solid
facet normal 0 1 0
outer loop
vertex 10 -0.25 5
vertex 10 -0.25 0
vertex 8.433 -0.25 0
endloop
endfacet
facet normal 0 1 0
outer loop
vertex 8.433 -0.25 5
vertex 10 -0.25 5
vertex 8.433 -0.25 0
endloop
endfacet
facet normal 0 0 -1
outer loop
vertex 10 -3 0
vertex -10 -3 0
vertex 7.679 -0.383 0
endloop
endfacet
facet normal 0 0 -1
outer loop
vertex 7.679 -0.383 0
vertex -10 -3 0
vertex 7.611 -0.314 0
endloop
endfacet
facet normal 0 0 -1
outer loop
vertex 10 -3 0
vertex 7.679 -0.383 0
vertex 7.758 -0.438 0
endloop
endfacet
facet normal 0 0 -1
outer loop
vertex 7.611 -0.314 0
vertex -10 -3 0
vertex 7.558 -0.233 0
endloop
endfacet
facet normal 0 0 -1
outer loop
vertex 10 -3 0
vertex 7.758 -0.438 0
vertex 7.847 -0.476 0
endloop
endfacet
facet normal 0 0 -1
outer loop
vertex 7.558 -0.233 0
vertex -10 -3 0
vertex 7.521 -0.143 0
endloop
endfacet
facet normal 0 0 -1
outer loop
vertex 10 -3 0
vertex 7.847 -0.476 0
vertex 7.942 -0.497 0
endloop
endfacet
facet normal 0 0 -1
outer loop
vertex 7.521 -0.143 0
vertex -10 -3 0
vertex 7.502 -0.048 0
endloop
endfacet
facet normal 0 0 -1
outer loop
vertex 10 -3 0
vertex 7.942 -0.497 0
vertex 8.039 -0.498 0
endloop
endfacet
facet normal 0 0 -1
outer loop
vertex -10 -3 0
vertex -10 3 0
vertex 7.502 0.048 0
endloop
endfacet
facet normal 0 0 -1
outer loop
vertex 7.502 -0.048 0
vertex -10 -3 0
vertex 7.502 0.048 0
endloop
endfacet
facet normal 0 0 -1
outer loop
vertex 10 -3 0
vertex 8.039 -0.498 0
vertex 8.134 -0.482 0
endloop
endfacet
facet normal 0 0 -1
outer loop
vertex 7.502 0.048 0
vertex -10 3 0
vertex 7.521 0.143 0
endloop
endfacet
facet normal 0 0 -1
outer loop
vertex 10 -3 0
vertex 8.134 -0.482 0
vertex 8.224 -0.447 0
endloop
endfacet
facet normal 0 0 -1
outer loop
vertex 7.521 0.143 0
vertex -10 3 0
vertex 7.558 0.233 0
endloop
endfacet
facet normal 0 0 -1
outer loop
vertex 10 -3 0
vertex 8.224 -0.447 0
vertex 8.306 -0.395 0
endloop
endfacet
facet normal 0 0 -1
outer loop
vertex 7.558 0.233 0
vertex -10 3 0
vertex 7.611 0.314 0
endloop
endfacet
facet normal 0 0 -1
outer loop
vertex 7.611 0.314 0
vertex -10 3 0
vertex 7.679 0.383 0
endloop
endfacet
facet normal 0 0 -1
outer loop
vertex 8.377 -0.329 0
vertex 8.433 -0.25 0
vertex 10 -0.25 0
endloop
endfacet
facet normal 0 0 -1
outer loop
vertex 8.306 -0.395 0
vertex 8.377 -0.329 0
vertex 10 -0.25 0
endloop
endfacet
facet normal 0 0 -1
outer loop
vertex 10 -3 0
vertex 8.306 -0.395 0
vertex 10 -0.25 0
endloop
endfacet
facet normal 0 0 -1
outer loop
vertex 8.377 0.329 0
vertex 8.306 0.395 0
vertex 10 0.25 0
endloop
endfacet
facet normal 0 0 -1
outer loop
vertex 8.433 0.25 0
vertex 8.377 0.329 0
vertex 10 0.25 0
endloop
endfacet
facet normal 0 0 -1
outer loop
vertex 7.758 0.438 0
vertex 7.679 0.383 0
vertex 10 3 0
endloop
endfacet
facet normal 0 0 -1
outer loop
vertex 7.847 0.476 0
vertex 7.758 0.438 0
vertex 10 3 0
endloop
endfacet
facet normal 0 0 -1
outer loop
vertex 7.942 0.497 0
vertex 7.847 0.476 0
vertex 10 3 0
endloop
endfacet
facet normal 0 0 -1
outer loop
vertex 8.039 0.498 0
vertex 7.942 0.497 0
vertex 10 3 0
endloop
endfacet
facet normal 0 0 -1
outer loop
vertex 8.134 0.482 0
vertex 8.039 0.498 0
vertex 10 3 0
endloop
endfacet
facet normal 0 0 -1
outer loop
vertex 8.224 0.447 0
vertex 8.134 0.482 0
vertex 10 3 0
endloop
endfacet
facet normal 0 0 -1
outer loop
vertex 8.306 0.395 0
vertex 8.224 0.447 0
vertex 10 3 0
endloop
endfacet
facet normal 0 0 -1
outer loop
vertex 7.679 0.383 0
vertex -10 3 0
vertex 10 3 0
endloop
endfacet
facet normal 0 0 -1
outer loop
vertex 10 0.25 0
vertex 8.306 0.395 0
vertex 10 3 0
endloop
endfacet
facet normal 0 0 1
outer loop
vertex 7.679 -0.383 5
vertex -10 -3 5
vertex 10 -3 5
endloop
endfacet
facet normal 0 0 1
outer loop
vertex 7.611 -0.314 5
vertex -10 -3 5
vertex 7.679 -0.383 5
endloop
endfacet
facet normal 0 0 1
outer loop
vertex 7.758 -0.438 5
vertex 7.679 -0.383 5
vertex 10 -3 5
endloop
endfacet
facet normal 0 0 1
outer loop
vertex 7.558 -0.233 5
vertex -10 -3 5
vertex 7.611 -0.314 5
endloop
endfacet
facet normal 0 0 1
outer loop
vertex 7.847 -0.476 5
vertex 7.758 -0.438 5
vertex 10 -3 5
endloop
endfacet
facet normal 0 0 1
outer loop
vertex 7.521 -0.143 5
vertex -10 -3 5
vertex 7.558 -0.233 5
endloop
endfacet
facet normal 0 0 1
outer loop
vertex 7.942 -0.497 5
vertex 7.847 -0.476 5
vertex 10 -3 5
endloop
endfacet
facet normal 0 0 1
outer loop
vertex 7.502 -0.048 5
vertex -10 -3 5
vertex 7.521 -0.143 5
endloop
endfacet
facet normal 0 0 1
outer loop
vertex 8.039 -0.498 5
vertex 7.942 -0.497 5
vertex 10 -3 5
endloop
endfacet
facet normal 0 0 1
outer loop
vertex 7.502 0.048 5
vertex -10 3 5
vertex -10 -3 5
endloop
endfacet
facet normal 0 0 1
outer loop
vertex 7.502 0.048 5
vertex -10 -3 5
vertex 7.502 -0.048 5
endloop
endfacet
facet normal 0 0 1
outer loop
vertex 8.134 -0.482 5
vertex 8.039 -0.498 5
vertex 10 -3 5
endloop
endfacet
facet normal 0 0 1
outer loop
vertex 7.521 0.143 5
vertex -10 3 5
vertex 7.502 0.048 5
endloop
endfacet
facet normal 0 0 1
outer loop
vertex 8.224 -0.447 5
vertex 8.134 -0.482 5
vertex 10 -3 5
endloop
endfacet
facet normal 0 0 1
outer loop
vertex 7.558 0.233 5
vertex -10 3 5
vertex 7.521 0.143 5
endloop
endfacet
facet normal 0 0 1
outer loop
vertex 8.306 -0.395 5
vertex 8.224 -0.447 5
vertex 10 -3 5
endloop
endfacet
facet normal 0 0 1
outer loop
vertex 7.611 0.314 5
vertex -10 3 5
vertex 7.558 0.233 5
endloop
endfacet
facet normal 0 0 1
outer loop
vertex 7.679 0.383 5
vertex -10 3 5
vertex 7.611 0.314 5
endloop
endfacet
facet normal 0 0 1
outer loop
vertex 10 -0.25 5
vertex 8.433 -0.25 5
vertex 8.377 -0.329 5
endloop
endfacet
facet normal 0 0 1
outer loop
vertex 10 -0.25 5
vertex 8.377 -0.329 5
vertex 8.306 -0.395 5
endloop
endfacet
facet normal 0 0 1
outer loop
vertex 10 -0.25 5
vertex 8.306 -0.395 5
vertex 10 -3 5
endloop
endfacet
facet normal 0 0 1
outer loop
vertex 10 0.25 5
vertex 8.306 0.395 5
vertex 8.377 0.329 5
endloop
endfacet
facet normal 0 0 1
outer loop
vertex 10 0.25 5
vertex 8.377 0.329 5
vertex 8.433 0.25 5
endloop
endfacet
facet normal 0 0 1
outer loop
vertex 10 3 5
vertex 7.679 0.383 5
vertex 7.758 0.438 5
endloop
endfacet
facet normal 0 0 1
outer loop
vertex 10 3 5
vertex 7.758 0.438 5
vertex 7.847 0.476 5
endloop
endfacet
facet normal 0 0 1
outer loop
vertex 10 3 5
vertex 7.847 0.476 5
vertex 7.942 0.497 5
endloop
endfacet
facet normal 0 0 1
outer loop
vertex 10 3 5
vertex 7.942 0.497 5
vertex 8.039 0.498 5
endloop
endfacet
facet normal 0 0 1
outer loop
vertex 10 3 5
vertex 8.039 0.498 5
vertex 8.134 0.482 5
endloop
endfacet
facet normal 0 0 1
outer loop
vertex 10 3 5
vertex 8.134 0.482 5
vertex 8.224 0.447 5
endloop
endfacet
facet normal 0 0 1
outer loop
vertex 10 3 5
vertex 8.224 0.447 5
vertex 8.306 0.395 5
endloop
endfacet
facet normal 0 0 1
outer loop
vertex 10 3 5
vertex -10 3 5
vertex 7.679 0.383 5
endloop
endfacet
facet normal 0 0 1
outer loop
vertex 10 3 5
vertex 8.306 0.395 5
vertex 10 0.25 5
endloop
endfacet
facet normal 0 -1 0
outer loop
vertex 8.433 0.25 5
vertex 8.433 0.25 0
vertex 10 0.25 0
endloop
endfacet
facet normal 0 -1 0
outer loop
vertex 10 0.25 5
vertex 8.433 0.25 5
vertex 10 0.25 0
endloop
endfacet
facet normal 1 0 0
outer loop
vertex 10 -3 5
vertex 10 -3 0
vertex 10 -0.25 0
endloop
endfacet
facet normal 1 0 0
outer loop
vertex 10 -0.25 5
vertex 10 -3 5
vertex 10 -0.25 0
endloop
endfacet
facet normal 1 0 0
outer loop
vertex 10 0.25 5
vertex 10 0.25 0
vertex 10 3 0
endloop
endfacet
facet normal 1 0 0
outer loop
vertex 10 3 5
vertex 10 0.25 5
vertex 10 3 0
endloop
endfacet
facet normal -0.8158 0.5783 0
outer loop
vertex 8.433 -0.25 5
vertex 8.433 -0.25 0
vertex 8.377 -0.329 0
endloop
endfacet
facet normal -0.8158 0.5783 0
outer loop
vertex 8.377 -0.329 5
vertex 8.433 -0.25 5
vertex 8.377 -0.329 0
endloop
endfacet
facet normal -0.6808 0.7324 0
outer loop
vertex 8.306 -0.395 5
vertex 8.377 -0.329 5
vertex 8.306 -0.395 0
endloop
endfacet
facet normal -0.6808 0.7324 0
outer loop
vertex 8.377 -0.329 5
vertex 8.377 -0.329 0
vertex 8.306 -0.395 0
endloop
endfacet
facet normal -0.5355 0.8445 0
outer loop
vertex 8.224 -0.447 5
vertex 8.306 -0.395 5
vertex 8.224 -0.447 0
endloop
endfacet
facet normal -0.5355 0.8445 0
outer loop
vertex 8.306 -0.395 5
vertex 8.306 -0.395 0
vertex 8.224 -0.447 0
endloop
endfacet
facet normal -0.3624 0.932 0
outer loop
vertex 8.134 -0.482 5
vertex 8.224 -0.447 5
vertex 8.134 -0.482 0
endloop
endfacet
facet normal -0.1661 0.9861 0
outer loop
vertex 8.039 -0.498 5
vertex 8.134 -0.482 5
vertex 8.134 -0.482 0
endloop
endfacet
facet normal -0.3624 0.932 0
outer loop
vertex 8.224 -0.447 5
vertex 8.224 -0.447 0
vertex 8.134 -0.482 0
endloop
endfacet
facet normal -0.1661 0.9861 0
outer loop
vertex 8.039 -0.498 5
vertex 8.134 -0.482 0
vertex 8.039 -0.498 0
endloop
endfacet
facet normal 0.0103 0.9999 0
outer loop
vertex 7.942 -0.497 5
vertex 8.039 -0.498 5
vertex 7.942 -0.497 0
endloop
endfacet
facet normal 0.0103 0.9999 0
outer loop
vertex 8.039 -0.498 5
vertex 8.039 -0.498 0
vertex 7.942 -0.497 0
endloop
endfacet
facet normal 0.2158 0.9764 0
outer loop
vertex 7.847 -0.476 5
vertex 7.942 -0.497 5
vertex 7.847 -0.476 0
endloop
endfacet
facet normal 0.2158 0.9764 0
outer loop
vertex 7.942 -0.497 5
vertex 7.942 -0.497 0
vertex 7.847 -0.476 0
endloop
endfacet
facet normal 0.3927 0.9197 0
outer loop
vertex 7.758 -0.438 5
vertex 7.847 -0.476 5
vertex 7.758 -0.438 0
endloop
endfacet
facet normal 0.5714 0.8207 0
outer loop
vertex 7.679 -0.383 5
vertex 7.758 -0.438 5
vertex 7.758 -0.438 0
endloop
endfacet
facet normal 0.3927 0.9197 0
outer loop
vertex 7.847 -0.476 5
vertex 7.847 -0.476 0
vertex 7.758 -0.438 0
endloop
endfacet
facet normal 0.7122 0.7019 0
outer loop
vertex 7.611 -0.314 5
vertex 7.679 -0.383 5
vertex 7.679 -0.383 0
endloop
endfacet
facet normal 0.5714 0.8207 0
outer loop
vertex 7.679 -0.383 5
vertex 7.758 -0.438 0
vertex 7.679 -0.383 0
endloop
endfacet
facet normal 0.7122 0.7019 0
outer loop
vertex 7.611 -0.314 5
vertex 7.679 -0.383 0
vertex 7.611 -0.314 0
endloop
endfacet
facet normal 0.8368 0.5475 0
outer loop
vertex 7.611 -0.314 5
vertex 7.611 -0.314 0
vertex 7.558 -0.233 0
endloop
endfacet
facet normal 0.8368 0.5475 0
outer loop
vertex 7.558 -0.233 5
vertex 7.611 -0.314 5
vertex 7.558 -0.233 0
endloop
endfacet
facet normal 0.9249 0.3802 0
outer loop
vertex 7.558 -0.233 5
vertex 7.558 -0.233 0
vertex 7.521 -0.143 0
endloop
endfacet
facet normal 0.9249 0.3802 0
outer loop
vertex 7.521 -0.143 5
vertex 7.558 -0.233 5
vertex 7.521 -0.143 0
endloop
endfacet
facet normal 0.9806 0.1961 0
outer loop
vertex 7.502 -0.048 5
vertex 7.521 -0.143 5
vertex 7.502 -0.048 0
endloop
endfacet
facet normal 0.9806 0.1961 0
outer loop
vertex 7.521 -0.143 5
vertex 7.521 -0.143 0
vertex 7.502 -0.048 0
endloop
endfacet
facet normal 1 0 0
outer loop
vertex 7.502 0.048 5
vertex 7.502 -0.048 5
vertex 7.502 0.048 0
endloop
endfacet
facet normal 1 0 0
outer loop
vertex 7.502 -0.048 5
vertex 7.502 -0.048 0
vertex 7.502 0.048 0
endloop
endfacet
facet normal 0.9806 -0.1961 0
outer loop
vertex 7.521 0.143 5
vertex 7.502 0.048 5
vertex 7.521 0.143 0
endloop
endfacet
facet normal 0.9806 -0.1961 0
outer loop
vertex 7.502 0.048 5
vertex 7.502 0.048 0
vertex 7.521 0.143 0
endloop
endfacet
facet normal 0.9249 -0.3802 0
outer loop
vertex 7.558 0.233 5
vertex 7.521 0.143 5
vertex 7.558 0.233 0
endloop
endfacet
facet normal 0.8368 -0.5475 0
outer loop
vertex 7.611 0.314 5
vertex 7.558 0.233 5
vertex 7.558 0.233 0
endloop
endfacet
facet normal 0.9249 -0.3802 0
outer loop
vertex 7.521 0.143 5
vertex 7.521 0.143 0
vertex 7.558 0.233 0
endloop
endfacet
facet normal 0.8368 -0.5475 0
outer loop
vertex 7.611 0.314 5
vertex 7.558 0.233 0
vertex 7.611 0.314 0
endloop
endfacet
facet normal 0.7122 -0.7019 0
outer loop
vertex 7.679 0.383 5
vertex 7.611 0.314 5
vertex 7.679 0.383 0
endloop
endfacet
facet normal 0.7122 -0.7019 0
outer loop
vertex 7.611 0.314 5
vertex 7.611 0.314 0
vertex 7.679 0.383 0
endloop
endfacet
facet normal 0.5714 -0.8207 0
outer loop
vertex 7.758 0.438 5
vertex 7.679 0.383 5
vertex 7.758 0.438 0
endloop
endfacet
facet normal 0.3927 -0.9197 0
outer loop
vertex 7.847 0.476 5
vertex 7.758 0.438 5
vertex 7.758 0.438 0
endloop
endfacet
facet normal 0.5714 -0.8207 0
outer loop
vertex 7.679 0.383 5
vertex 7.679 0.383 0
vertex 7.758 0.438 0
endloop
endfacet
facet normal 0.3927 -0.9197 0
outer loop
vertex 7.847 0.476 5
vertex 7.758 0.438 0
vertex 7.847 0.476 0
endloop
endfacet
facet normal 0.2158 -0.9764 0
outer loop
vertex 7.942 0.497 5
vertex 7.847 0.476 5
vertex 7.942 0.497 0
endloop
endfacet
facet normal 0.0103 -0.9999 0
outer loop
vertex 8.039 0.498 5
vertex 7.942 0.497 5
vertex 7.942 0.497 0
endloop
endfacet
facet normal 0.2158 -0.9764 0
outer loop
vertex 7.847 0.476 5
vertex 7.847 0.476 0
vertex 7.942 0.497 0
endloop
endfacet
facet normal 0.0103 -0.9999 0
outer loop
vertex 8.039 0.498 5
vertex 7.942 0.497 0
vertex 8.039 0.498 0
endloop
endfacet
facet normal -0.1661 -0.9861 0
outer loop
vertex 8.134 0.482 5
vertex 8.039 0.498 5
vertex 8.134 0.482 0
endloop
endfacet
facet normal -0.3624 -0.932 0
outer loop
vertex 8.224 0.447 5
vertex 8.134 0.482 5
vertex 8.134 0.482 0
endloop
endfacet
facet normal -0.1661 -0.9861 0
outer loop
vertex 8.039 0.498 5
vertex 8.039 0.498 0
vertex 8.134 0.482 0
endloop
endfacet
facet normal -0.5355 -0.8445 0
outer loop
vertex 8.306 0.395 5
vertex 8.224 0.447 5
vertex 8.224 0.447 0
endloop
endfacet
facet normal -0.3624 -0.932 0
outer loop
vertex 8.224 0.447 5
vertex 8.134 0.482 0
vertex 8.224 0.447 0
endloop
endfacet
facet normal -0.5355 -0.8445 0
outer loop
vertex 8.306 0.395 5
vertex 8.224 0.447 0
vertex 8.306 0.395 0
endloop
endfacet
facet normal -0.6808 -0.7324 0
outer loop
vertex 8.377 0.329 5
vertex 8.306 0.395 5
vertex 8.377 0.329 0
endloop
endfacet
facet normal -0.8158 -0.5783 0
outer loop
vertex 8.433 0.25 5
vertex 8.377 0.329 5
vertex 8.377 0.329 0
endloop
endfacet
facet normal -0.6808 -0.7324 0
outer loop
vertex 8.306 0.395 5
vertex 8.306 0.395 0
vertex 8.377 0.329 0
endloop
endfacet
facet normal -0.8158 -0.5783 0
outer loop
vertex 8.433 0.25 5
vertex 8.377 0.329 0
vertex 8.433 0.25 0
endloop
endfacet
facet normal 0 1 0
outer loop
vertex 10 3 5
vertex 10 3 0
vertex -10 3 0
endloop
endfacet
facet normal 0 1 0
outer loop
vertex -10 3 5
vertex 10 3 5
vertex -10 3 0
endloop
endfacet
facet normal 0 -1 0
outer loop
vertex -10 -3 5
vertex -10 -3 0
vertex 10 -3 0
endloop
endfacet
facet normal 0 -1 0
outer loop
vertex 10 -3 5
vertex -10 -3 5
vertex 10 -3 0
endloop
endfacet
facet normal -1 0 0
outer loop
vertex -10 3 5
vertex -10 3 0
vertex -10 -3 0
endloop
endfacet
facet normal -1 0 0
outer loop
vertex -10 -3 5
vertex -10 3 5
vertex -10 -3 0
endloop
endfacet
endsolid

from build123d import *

# Parameters (mm, degrees)
F1_DEPTH = 5


with BuildPart() as f1:
    # F0 (on Top) → F1 (new body)
    with BuildSketch(Plane.XY):
        with BuildLine():
            Line((-10, -3), (10, -3))
            Line((10, -3), (10, -0.25))
            Line((10, -0.25), (8.433013, -0.25))
            ThreePointArc((8.433013, -0.25), (7.5, 0), (8.433013, 0.25))
            Line((8.433013, 0.25), (10, 0.25))
            Line((10, 0.25), (10, 3))
            Line((10, 3), (-10, 3))
            Line((-10, 3), (-10, -3))
        make_face()
    extrude(amount=F1_DEPTH)


solid = f1.part
